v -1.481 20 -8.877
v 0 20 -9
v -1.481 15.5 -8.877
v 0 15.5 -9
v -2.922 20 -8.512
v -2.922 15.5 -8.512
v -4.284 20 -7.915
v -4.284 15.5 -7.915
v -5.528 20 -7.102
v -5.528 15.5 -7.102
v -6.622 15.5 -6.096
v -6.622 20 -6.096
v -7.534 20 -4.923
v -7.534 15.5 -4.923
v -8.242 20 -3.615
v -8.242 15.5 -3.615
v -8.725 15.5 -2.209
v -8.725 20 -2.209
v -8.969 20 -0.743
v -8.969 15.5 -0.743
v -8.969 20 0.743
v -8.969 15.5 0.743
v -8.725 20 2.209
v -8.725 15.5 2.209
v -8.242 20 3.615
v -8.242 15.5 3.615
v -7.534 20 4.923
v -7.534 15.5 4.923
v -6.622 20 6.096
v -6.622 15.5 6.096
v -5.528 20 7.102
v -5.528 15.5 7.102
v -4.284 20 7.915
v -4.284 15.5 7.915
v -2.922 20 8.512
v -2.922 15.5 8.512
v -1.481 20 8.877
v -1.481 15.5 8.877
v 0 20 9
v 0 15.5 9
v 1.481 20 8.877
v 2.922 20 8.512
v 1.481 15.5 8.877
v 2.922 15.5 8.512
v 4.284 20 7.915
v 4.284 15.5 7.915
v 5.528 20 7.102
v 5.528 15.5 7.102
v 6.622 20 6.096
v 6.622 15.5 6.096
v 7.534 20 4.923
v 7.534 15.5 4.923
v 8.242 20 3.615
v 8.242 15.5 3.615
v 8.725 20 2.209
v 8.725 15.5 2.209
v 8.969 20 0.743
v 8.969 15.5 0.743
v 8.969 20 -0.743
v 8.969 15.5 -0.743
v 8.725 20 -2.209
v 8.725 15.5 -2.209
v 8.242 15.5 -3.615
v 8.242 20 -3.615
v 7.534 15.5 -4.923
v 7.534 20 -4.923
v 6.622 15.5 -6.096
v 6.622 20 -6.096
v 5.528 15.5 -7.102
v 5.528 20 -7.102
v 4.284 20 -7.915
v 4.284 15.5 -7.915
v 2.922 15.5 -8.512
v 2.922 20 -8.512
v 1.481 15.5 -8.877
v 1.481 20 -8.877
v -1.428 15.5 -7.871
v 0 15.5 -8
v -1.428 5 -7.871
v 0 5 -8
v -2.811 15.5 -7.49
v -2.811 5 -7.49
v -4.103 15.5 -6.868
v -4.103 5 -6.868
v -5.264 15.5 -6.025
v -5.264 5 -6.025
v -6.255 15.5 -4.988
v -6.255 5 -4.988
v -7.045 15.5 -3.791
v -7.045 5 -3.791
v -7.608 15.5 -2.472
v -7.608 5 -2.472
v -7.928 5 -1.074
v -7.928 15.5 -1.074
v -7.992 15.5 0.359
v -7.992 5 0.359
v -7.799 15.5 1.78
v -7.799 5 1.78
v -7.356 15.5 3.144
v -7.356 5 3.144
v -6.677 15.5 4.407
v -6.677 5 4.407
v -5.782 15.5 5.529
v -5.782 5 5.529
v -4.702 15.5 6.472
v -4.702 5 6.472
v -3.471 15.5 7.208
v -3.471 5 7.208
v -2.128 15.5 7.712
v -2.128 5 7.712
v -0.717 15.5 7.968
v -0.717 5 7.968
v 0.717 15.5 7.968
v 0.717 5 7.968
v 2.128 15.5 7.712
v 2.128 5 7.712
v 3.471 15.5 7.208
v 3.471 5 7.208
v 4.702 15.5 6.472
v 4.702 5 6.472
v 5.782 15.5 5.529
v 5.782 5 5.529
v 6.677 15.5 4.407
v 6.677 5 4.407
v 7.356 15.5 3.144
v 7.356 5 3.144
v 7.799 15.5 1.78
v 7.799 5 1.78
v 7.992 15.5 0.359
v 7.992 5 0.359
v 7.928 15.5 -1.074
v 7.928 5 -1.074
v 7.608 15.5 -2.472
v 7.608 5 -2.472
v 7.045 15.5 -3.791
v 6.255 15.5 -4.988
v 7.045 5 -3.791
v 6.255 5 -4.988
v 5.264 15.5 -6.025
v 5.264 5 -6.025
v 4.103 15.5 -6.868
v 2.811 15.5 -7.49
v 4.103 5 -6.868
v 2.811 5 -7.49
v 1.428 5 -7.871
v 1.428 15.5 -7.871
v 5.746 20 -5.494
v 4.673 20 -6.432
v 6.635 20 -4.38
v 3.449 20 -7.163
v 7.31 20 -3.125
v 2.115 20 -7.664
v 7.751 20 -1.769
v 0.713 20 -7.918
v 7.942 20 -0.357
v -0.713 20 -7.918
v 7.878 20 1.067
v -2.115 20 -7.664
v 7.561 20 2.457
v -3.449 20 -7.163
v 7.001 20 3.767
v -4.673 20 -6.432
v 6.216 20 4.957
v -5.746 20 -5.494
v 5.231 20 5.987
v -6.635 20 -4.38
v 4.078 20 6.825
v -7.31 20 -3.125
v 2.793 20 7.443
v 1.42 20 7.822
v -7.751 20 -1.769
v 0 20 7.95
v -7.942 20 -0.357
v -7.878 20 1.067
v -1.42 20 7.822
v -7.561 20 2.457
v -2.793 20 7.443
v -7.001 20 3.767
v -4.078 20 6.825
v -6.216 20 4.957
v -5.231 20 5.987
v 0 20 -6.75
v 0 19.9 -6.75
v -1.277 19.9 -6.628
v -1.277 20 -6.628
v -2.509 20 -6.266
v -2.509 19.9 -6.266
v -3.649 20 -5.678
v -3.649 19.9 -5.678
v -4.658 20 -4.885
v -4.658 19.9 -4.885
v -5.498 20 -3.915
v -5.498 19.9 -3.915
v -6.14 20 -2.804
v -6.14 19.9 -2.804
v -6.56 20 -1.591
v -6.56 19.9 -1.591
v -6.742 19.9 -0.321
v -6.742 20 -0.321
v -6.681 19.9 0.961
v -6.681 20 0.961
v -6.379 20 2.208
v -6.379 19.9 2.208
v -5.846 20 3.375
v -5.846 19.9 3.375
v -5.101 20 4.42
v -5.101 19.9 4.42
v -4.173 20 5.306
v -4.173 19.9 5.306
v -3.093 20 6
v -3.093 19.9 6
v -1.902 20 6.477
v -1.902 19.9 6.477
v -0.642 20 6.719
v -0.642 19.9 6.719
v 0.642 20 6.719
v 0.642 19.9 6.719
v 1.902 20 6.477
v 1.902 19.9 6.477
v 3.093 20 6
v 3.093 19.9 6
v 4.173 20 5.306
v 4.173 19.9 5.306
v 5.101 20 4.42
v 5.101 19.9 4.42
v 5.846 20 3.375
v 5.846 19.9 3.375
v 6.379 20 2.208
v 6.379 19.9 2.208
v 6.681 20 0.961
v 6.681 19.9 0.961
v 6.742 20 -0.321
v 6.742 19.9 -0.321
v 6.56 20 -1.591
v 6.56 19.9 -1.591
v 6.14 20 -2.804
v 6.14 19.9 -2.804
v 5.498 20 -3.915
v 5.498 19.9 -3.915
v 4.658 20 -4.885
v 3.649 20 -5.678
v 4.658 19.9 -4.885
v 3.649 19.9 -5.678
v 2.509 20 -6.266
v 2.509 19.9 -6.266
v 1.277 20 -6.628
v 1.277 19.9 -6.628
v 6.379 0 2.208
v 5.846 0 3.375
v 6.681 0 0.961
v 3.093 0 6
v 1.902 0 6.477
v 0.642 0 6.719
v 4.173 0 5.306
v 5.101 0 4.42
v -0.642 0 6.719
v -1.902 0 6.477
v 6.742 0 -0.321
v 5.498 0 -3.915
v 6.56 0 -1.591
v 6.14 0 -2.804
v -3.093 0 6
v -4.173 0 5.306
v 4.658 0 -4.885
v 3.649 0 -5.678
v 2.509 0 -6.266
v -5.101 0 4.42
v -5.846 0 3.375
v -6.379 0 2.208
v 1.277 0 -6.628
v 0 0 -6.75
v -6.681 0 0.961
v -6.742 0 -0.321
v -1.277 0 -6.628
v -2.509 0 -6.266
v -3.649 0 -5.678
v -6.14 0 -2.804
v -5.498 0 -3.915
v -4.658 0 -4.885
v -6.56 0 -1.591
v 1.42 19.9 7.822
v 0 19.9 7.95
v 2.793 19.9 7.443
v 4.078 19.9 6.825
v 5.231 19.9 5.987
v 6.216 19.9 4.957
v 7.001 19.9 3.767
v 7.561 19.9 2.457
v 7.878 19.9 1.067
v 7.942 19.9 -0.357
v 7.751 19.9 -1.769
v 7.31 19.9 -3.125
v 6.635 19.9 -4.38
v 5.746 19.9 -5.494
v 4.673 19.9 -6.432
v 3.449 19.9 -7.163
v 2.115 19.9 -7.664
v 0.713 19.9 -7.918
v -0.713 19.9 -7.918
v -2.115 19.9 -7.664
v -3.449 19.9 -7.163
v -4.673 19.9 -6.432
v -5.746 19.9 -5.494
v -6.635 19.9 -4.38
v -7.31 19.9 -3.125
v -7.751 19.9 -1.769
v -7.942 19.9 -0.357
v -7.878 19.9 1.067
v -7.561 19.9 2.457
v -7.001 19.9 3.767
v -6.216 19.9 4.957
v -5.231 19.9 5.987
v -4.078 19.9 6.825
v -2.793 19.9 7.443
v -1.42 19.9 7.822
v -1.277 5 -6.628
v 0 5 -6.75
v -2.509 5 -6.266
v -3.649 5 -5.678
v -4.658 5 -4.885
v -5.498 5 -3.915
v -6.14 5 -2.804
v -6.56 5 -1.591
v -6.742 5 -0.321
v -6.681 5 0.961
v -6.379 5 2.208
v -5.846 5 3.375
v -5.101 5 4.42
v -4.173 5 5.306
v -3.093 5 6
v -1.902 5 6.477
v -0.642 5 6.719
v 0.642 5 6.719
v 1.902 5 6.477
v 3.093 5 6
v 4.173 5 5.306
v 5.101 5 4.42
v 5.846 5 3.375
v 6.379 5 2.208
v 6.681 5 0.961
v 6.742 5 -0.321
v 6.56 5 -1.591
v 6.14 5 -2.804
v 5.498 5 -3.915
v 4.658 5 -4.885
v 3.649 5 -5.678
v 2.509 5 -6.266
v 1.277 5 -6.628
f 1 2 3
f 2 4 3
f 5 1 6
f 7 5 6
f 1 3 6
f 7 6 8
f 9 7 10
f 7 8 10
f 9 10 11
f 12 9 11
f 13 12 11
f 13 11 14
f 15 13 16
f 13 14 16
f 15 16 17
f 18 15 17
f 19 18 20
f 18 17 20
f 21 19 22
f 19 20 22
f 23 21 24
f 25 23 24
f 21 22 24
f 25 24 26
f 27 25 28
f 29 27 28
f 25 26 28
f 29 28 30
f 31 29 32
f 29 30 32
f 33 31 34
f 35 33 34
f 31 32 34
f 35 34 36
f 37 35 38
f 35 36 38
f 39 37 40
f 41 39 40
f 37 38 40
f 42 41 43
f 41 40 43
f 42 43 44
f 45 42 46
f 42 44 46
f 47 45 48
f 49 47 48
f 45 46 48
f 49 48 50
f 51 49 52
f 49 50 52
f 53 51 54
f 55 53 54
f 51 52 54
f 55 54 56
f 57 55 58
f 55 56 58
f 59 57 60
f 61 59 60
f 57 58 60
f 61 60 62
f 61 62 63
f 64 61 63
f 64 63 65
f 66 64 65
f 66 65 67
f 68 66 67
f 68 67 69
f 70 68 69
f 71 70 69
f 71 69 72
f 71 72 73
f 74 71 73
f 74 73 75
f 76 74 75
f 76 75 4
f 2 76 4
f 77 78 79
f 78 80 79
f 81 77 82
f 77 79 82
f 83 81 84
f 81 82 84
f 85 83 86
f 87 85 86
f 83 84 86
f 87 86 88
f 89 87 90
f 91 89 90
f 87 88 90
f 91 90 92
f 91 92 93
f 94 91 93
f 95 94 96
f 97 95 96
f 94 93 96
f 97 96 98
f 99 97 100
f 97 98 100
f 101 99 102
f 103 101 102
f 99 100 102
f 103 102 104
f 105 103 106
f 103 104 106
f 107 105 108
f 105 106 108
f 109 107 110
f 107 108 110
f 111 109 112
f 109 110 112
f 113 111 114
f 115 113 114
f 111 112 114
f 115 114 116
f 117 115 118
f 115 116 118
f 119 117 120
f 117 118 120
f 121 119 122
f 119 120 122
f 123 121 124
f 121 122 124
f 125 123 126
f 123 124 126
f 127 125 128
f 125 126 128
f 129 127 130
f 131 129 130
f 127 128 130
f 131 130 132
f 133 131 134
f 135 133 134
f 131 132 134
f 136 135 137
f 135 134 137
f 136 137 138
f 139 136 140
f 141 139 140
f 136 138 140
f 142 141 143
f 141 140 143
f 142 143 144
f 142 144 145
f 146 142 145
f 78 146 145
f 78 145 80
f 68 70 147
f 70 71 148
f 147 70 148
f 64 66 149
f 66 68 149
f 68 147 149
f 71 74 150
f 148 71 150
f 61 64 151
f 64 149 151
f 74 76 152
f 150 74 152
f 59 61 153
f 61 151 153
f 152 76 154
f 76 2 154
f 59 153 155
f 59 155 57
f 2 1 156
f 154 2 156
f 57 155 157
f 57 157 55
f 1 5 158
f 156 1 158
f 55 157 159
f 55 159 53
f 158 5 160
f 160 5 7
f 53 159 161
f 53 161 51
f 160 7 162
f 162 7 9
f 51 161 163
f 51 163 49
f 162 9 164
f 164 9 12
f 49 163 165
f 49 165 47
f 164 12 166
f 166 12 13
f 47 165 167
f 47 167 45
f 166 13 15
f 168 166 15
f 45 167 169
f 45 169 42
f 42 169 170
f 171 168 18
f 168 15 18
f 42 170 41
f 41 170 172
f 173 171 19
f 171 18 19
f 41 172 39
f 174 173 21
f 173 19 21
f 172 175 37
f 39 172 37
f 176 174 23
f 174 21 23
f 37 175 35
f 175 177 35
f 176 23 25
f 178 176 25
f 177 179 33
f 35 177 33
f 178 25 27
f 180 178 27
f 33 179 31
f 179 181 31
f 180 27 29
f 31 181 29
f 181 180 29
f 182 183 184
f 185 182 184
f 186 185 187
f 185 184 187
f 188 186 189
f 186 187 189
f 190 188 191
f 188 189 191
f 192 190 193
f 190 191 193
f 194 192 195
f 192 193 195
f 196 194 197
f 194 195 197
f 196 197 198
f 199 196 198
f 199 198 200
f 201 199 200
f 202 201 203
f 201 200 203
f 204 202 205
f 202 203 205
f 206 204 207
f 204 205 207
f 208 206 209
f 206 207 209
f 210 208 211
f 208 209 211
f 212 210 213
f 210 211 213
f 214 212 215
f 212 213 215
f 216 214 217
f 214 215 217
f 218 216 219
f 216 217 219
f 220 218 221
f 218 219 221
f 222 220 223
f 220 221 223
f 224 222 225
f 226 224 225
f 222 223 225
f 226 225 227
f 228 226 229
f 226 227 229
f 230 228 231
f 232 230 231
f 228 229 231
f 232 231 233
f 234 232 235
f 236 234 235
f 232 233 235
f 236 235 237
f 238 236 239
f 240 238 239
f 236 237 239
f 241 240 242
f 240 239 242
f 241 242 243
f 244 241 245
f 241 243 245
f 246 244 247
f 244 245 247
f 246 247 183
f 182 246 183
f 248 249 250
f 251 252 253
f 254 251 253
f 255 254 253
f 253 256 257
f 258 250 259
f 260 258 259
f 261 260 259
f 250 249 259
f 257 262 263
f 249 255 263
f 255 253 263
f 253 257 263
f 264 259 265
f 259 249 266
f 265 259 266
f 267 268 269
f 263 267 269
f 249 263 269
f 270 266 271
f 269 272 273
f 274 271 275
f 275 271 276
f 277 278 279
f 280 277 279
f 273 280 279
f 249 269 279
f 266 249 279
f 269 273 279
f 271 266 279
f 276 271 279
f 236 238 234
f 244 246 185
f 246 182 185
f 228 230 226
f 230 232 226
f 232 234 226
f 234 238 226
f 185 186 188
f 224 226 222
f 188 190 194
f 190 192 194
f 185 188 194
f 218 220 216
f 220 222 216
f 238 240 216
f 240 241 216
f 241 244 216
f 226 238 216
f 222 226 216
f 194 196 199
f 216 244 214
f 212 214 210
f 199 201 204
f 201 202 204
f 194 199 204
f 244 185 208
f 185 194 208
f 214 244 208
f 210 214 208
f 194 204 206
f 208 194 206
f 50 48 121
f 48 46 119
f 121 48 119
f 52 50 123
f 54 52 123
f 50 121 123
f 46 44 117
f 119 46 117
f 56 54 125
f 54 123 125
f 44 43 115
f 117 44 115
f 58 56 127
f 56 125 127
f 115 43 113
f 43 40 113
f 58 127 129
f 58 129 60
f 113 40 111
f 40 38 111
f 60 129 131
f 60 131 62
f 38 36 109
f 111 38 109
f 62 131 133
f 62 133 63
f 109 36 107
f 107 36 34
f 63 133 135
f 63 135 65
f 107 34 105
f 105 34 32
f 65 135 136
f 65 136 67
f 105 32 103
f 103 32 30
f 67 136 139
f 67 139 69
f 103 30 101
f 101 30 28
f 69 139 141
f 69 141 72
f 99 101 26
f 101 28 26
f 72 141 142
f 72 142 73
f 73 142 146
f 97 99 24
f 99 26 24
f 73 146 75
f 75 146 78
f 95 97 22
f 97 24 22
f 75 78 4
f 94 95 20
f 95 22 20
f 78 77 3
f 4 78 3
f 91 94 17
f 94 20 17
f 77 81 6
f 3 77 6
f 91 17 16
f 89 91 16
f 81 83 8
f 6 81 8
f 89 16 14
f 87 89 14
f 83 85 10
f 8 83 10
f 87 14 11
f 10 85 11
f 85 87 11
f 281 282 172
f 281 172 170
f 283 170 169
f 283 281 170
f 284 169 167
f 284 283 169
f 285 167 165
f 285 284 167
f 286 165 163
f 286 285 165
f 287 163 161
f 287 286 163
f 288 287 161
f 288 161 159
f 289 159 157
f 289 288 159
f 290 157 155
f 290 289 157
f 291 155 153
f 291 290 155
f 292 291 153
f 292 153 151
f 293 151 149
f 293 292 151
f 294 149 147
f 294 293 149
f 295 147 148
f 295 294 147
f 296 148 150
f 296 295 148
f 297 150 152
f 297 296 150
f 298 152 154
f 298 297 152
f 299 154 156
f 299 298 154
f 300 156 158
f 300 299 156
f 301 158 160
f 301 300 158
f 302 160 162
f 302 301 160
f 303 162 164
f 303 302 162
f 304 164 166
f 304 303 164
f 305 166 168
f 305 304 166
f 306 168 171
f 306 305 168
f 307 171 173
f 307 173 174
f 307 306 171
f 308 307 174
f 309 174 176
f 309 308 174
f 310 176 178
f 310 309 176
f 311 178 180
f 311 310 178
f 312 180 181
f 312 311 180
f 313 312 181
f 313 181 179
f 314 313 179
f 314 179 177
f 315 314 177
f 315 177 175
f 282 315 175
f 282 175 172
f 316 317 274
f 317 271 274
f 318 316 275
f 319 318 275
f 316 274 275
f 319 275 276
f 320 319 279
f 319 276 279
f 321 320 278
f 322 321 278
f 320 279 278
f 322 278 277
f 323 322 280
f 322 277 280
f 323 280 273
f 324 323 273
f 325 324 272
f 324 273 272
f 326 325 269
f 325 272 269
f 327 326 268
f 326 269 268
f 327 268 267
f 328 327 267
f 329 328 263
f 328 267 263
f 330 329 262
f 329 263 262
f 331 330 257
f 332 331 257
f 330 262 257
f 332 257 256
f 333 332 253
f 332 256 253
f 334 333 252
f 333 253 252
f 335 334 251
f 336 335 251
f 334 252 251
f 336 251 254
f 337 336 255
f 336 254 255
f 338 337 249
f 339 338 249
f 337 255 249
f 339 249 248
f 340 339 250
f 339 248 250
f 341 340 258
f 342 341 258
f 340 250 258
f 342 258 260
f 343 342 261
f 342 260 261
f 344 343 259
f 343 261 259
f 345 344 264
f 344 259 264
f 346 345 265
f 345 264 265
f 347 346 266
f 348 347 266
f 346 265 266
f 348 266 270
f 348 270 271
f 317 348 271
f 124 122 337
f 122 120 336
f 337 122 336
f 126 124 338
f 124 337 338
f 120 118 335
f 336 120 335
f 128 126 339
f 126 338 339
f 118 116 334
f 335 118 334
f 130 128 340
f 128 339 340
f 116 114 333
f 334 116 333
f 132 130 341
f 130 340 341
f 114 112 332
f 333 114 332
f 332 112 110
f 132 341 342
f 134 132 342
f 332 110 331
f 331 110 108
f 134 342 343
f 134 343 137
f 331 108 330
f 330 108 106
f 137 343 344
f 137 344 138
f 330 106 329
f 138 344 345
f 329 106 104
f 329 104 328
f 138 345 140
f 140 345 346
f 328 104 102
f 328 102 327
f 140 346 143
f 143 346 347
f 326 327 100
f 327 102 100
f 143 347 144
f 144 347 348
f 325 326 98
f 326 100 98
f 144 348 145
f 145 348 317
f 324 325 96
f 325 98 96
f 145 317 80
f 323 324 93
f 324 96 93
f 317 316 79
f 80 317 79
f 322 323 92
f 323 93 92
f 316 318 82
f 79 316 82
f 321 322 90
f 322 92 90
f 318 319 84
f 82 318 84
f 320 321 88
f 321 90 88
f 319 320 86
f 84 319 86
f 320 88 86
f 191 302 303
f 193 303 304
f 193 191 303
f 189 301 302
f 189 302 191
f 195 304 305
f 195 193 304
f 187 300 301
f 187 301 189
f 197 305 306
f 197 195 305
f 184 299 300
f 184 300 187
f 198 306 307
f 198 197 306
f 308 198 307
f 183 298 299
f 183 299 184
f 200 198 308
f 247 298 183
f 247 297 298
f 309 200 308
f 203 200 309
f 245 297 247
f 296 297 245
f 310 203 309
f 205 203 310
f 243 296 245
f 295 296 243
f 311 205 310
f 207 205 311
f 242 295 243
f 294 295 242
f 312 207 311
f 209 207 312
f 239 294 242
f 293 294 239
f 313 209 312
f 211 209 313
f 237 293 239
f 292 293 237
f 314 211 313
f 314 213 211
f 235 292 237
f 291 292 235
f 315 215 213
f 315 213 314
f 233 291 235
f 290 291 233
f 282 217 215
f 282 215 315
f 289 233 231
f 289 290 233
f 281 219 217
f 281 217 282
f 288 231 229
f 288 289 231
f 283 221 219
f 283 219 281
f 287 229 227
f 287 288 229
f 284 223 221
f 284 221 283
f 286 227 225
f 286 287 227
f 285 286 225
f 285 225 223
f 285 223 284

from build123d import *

# Parameters (mm, degrees)
CUT_EXTRUDE1_START = -0.1
SKETCH2_R          = 7.95
SKETCH2_R_2        = 6.75
CUT_EXTRUDE1_DEPTH = 0.1


with BuildPart() as part:
    # Sketch1 → Revolve1 (revolve)
    with BuildSketch(Plane(origin=(0, 0, 0), x_dir=(0, 0, -1), z_dir=(1, 0, 0))):
        Polygon((0, 20), (9, 20), (9, 15.5), (8, 15.5), (8, 5), (6.75, 5), (6.75, 0), (0, 0), align=None)
    revolve(axis=Axis((0, 0, 0), (0, 1, 0)))

    # Sketch2 → Cut-Extrude1 (cut)
    with BuildSketch(Plane(origin=(0, 20, 0), x_dir=(1, 0, 0), z_dir=(0, 1, 0)).offset(CUT_EXTRUDE1_START)):
        with Locations(Location((0, 0, 0), (0, 0, 270))):
            Circle(SKETCH2_R)
        with Locations(Location((0, 0, 0), (0, 0, 90))):
            Circle(SKETCH2_R_2, mode=Mode.SUBTRACT)
    extrude(amount=CUT_EXTRUDE1_DEPTH, mode=Mode.SUBTRACT)


solid = part.part
